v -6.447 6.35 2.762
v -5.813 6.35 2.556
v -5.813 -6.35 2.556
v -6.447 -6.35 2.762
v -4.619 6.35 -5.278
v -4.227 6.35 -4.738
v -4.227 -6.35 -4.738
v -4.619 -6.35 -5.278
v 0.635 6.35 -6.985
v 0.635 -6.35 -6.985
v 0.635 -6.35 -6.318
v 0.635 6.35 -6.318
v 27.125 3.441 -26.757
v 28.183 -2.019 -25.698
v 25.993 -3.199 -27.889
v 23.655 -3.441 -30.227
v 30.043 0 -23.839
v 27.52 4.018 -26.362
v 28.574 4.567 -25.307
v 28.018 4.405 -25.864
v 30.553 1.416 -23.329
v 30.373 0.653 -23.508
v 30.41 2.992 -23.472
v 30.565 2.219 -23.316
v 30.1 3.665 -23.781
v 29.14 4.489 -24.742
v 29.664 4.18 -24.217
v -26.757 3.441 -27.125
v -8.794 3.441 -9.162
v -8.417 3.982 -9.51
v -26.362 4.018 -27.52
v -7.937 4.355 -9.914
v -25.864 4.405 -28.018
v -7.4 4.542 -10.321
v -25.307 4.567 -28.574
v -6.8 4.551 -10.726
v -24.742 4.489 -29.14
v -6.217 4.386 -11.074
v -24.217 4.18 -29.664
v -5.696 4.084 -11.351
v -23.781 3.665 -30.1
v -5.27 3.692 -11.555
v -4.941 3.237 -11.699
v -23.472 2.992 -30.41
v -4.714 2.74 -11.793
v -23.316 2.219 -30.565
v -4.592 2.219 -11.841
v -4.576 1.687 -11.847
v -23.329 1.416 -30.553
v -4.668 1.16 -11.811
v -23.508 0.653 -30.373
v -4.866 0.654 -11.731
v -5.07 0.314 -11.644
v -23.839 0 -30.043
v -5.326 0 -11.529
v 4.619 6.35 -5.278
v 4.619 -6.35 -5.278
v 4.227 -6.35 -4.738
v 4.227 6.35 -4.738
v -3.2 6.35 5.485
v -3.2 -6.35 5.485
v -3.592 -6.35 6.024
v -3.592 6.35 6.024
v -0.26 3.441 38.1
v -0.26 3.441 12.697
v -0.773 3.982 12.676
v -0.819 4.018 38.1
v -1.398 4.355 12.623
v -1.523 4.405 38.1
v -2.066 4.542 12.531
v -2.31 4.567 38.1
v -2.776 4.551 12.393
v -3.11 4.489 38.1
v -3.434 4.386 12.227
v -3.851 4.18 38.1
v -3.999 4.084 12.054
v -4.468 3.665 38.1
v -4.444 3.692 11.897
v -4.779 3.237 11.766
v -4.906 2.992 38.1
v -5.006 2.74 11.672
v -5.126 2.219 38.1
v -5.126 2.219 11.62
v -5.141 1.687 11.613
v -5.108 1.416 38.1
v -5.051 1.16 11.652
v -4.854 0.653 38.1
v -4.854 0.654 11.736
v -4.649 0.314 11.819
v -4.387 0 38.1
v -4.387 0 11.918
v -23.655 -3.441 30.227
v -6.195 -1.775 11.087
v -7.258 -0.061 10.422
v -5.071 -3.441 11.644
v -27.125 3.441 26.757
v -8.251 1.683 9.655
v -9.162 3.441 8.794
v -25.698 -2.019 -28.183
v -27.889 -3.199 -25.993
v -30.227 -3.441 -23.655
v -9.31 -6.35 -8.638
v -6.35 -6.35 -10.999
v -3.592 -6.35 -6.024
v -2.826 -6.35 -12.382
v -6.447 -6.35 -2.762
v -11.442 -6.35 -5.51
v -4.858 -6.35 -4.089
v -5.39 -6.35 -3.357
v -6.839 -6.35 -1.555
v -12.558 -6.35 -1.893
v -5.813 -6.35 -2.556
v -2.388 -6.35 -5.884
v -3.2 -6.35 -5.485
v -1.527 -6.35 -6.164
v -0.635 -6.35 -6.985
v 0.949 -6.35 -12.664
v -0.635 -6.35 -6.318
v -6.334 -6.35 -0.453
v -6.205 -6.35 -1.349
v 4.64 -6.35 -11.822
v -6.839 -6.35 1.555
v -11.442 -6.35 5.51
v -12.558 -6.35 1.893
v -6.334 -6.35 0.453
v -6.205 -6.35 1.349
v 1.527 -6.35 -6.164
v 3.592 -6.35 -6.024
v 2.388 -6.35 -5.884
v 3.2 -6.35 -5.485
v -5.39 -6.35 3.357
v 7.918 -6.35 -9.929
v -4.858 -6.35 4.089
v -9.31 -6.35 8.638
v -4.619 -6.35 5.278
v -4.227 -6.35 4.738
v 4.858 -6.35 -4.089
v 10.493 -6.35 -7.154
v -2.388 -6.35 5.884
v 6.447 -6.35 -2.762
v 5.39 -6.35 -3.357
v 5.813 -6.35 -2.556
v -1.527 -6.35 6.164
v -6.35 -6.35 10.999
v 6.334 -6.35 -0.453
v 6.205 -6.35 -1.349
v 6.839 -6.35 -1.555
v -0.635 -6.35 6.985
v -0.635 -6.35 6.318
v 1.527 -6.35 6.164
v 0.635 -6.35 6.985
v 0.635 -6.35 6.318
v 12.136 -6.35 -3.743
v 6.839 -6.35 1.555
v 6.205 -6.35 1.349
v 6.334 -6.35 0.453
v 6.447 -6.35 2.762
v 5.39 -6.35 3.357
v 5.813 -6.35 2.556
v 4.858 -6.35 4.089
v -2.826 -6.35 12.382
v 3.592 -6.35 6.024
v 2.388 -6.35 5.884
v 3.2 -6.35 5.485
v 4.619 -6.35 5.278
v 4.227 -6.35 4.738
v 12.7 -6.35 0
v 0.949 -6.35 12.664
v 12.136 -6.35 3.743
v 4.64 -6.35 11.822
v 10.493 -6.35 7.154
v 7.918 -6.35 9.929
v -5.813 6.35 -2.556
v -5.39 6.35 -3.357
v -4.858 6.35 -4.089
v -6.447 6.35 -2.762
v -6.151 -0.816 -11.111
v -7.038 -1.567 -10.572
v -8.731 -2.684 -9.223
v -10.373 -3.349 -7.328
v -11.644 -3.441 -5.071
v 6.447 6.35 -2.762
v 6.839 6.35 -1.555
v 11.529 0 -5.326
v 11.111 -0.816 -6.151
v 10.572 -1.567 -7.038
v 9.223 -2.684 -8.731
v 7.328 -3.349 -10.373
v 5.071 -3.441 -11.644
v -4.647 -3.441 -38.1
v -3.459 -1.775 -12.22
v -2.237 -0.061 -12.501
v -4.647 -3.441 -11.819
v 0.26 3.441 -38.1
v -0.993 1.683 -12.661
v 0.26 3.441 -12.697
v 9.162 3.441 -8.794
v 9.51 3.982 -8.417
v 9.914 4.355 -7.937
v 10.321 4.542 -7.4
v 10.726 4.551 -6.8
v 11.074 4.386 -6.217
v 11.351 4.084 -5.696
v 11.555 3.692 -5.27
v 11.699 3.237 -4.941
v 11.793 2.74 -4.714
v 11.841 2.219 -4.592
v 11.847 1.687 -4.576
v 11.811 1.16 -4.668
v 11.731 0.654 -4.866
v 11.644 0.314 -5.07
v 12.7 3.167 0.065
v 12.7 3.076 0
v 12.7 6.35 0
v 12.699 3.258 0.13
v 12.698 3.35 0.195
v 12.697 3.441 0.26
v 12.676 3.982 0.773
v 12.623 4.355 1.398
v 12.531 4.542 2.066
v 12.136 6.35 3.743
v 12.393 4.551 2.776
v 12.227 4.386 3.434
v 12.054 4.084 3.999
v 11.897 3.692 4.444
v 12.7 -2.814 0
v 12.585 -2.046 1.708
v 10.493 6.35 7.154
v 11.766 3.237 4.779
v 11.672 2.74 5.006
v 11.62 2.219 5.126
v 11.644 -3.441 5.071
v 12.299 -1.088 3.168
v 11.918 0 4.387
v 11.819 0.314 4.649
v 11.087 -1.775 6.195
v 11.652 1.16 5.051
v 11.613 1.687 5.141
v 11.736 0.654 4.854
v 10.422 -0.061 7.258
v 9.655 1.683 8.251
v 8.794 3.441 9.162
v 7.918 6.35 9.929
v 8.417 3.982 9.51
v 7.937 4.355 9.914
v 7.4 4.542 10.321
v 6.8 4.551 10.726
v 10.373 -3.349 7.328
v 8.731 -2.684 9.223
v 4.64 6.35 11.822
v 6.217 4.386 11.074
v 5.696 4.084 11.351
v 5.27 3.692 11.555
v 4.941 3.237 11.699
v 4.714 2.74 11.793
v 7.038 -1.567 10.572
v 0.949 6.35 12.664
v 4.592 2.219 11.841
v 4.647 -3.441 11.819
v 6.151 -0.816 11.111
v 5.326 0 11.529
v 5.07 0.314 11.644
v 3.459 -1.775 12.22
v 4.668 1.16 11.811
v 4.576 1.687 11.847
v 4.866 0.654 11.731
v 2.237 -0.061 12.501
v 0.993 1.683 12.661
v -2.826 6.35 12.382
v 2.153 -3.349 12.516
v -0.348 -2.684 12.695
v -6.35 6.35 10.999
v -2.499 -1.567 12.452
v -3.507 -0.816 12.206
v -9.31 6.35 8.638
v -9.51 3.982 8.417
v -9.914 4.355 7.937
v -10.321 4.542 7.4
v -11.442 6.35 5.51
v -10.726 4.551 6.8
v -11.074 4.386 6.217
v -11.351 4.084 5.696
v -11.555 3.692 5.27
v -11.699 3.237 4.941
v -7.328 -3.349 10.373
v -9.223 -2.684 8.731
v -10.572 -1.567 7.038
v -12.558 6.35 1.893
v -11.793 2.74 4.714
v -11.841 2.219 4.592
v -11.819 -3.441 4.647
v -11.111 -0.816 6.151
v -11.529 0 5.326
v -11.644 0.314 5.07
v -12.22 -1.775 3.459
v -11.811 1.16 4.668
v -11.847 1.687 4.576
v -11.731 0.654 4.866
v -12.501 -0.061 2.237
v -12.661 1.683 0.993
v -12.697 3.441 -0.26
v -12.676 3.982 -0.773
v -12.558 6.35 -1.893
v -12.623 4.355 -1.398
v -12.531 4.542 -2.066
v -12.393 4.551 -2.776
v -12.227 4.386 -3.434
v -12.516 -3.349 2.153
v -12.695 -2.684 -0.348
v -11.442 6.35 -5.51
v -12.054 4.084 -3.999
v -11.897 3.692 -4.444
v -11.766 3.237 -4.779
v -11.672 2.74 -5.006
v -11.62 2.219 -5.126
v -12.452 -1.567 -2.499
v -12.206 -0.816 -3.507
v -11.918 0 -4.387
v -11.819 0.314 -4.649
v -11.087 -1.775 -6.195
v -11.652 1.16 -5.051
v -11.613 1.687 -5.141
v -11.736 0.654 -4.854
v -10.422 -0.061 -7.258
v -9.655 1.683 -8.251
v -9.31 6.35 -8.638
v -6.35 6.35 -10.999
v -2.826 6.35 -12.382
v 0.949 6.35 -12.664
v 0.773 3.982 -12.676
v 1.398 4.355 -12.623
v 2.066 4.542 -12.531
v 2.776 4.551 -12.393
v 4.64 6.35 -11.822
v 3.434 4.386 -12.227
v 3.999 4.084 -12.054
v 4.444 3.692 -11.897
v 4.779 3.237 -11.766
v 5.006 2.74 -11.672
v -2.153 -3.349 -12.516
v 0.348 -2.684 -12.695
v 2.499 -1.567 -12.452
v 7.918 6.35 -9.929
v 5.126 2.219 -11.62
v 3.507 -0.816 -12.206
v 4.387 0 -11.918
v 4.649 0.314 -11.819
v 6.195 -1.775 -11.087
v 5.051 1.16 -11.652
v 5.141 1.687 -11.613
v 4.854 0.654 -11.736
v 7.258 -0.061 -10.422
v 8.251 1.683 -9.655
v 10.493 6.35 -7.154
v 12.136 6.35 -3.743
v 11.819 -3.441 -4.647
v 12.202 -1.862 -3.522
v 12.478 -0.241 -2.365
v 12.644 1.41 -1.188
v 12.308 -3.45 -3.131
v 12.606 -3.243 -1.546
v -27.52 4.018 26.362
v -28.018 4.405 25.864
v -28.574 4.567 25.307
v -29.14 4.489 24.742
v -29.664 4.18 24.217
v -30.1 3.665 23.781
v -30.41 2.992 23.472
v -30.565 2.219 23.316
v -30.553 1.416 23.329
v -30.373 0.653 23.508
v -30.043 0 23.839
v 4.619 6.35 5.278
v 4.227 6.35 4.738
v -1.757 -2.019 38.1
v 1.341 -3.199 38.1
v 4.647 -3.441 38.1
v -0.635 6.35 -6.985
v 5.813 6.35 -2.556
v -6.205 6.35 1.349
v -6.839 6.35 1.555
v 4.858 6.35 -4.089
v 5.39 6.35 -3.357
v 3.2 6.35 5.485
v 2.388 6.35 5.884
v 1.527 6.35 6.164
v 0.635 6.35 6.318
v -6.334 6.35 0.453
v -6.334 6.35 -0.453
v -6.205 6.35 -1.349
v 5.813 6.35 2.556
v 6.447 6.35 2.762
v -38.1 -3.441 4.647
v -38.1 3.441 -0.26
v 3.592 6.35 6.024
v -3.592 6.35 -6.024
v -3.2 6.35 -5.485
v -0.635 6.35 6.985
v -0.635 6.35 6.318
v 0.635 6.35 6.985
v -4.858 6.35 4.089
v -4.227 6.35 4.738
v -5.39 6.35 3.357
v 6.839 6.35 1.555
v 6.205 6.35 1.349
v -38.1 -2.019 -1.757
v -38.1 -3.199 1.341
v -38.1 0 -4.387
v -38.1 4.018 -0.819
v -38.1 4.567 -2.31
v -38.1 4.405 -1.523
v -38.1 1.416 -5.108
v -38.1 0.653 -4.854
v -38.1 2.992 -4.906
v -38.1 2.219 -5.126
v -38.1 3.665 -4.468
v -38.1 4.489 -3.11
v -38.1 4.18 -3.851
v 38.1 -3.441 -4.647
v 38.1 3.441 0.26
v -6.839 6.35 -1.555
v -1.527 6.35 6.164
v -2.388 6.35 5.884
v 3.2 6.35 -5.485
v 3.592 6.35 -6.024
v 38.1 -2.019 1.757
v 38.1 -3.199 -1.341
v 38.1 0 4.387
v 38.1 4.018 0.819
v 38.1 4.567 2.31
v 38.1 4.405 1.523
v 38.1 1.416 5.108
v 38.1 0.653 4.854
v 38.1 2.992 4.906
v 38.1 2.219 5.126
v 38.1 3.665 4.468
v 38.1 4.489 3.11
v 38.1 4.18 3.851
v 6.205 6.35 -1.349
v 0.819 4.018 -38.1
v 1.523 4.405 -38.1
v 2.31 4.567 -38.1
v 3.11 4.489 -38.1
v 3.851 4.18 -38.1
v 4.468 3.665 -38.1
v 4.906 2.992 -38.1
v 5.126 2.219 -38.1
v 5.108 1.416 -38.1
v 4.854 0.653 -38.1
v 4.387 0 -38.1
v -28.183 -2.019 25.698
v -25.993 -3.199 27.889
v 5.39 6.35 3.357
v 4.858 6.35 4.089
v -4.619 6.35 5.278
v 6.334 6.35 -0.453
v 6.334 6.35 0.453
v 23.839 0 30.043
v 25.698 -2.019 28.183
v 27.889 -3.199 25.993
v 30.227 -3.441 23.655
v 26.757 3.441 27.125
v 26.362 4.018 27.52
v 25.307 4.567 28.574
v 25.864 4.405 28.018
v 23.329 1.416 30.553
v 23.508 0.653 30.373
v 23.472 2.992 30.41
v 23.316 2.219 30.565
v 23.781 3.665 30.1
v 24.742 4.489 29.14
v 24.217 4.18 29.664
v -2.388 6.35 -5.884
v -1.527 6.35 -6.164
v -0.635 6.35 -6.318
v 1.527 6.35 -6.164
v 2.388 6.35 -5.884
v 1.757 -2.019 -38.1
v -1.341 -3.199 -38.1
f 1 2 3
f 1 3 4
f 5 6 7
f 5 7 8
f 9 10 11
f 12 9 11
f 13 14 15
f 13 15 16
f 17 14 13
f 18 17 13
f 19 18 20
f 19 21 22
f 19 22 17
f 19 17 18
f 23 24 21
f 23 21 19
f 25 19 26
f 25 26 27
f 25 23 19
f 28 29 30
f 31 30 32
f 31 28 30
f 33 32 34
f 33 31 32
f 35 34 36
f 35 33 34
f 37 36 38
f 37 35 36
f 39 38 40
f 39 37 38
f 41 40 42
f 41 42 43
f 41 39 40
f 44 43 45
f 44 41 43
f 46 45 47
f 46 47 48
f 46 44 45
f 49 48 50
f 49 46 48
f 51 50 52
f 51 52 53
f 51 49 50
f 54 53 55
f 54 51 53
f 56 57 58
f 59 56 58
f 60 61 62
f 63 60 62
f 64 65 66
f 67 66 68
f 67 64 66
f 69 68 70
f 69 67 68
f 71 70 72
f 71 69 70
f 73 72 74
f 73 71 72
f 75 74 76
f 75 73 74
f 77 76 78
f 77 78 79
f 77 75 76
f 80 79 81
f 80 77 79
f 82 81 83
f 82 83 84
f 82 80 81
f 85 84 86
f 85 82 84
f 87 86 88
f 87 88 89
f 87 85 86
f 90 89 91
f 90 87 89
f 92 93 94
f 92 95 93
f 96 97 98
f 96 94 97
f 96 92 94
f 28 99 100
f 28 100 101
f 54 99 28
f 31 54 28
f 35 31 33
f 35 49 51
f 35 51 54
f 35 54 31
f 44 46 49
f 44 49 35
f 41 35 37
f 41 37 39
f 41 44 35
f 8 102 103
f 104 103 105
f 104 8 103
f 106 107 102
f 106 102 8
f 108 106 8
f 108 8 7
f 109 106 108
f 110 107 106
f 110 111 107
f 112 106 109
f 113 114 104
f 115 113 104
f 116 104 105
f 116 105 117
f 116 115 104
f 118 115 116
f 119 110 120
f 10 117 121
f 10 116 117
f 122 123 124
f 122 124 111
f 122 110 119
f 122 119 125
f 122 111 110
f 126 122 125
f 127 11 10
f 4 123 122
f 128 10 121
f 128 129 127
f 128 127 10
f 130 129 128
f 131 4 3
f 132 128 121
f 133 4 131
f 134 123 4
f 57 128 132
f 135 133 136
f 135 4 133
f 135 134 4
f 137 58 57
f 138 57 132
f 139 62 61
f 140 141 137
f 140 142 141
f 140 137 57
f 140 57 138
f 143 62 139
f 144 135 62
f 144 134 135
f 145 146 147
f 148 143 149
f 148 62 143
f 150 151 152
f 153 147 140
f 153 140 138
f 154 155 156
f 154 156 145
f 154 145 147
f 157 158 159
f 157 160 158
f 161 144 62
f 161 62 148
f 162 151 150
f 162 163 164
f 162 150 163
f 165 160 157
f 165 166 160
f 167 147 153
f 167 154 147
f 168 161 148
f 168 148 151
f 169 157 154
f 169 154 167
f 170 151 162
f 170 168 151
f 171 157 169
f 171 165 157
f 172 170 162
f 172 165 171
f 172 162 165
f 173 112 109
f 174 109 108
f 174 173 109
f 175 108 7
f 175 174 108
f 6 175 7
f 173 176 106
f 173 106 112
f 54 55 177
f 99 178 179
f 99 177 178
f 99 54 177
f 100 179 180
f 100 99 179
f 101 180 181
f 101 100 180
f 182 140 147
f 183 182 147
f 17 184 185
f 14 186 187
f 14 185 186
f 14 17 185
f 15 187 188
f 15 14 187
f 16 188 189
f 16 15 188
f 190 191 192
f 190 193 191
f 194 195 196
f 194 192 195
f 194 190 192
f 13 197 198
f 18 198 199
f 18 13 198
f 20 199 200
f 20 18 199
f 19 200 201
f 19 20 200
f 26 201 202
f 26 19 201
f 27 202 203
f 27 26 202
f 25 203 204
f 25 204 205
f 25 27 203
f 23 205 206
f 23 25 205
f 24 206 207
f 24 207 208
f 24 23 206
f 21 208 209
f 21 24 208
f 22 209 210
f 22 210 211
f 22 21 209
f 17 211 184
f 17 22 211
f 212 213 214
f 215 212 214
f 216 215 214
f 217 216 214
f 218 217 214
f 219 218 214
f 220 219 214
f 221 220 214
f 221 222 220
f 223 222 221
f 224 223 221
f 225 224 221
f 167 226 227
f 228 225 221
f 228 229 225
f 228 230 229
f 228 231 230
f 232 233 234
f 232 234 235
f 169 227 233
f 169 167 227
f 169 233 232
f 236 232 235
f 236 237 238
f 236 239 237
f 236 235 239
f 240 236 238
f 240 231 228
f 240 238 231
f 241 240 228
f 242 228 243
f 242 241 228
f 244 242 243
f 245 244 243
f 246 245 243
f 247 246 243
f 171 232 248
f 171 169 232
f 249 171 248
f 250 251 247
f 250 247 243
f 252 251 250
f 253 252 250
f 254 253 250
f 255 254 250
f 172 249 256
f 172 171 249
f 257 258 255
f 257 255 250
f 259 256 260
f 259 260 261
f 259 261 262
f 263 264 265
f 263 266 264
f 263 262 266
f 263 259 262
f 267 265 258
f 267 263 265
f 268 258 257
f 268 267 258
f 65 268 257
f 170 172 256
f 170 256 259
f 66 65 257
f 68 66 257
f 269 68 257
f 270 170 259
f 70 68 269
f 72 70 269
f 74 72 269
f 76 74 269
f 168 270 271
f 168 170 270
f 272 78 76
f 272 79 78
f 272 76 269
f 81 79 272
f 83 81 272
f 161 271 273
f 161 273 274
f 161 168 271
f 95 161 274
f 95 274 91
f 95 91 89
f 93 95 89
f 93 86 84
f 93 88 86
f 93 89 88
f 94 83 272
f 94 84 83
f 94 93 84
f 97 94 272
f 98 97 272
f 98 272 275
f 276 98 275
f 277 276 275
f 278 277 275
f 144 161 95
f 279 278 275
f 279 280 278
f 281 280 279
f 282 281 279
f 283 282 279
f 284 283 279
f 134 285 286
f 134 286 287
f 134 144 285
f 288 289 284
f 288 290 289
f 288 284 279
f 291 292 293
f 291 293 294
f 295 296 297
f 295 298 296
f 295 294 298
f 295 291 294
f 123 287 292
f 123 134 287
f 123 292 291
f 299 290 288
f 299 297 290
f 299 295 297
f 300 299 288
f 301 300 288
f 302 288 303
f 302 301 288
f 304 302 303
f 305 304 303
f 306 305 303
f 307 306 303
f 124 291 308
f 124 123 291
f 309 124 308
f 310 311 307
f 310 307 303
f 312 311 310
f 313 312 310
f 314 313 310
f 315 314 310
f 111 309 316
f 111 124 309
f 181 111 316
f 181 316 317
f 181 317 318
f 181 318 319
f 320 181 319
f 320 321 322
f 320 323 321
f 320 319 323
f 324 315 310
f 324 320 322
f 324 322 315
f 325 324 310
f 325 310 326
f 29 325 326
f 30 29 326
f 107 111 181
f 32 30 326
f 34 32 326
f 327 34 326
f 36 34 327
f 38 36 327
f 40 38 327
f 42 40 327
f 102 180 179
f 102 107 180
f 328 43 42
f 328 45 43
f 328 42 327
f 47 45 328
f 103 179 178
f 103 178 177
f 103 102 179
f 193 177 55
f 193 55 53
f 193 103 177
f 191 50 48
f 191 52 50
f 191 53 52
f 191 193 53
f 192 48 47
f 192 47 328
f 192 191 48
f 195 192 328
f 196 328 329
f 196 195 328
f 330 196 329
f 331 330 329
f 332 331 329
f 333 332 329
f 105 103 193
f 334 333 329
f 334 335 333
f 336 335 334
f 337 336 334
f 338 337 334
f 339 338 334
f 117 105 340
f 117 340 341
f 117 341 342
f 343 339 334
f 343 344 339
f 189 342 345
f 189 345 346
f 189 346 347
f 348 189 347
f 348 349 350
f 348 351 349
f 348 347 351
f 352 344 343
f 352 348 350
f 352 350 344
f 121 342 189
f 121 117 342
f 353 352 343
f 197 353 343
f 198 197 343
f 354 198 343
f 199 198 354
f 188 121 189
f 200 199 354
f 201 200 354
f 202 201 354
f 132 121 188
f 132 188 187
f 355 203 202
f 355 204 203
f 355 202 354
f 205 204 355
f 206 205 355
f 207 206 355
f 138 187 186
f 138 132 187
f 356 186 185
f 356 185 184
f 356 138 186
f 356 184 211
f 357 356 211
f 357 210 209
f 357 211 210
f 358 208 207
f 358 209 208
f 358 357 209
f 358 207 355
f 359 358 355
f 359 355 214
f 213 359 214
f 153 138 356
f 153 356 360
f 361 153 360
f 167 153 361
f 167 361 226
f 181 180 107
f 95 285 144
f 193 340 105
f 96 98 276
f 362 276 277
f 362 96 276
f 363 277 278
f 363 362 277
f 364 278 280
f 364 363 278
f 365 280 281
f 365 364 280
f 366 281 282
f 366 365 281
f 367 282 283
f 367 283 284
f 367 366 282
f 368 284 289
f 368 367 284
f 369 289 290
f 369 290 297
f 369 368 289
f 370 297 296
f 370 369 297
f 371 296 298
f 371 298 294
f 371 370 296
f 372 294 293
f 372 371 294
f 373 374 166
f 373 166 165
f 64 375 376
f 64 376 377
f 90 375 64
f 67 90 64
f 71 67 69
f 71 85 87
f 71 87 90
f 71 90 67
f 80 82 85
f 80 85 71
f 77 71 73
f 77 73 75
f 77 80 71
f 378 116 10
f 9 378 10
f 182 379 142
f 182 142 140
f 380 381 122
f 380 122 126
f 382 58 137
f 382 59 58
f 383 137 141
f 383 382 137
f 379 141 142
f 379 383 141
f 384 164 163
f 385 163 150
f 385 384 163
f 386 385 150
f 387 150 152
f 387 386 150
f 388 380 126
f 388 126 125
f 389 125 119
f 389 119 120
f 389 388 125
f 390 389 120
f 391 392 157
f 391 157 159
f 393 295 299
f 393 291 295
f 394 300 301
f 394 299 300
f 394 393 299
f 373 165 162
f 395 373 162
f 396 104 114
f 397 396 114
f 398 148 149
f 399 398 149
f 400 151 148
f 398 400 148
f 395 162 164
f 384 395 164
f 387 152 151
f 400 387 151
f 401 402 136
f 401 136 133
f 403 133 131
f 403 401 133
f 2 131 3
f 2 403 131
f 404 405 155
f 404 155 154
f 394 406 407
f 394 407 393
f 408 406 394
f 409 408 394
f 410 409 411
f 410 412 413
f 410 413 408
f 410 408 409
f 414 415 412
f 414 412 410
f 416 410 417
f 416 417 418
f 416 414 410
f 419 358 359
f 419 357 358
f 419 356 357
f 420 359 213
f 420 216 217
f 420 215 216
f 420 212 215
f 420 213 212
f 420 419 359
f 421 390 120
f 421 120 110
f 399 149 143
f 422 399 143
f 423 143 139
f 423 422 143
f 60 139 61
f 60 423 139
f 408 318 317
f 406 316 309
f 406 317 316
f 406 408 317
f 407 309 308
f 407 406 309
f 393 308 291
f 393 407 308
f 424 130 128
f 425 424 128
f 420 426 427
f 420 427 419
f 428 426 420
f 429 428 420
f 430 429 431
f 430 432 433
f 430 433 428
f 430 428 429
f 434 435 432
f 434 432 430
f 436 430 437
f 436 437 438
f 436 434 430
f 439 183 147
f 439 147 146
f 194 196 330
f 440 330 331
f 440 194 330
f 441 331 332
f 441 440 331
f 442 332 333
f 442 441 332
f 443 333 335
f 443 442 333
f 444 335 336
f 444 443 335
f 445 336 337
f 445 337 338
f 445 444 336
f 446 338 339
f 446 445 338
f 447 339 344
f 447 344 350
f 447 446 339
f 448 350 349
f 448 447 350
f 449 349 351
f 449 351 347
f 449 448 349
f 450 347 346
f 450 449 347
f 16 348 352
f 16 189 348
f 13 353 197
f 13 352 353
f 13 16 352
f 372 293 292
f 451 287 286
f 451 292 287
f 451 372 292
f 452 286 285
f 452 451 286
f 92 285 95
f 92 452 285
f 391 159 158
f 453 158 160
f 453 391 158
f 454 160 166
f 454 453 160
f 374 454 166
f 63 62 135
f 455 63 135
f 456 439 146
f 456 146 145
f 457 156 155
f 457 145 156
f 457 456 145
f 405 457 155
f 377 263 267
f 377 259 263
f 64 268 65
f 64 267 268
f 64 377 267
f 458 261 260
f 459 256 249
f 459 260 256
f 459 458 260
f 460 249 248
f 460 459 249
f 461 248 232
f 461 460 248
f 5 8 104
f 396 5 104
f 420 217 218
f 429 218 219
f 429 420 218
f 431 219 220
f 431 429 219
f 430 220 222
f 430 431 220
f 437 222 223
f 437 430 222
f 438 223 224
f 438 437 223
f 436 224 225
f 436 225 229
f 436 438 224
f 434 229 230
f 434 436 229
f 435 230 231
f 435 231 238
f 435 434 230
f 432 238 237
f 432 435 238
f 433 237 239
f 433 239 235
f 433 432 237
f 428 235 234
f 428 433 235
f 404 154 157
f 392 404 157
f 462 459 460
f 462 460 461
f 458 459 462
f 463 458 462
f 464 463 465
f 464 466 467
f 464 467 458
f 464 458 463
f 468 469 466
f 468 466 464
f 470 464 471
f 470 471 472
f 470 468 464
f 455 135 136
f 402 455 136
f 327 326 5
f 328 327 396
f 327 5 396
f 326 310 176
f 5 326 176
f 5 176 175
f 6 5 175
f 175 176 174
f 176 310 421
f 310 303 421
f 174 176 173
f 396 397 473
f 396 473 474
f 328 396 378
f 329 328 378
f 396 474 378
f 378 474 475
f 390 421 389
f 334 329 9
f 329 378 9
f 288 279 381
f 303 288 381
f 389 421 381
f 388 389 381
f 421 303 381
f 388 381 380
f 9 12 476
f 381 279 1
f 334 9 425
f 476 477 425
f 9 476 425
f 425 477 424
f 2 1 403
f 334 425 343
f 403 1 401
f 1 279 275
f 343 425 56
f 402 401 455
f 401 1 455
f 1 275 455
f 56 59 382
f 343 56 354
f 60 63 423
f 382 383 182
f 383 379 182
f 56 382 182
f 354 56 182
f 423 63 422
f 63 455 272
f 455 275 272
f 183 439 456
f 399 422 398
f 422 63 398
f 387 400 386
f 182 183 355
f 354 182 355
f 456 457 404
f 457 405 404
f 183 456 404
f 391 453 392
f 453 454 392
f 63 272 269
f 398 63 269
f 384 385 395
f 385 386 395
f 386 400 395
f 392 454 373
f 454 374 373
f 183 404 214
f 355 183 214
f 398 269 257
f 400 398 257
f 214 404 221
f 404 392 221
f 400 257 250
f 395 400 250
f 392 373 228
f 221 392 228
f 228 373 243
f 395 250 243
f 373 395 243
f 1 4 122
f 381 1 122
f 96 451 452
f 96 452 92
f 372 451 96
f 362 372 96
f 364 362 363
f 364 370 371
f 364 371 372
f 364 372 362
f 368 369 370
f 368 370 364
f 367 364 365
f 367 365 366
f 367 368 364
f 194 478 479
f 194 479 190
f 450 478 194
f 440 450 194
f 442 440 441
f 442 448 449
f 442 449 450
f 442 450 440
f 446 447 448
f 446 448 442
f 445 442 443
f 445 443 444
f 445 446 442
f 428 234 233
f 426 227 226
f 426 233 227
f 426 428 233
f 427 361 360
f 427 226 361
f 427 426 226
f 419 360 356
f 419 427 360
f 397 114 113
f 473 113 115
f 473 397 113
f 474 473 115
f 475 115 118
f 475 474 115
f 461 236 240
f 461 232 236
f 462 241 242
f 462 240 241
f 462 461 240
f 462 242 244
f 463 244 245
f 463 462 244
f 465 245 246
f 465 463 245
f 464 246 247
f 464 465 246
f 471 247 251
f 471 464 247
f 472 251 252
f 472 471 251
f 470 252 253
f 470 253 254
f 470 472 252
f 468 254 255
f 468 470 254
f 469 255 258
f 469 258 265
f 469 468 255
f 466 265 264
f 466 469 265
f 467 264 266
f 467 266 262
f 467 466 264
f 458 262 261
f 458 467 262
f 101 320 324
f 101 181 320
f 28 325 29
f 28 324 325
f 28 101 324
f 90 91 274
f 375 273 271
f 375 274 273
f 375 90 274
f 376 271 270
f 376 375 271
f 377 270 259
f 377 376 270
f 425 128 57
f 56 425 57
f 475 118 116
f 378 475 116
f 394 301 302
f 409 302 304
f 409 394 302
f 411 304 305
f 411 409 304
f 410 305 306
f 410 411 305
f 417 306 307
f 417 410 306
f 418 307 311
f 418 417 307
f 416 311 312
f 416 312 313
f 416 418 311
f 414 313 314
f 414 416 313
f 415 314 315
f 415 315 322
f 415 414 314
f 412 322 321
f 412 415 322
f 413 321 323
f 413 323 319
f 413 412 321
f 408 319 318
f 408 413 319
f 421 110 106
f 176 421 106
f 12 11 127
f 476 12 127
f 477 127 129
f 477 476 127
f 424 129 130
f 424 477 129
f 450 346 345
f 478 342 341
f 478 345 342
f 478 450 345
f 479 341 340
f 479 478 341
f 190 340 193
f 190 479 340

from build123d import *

# Parameters (mm, degrees)
F0_R            = 12.7
F0_R_2          = 6.35
F1_DEPTH        = 6.35
F4_DEPTH        = 25.4
F7_DEPTH        = 30.48
F7_COPIES_COUNT = 8


# Not quite as in the source:
# - a pattern or mirror of a feature is missing from the dataset's text; its kind, count and spacing are read off the source's solid


with BuildPart() as f1:
    # F0 (on Front) → F1 (new body, symmetric)
    with BuildSketch(Plane.XZ):
        Circle(F0_R)
        Circle(F0_R_2, mode=Mode.SUBTRACT)
    extrude(amount=F1_DEPTH, both=True)

    # F3 (on offset) → F4 (cut)
    with BuildSketch(Plane.XZ.offset(6.35)):
        with BuildLine():
            Line((-3.2000014887, 5.4847507211), (-3.5919541958, 6.0242273409))
            Line((-3.5919541958, 6.0242273409), (-4.6194057787, 5.2777400705))
            Line((-4.6194057787, 5.2777400705), (-4.2274530715, 4.7382634507))
            ThreePointArc((-4.2274530715, 4.7382634507), (-3.7324363521, 5.1372579143), (-3.2000014887, 5.4847507211))
        make_face()
        with BuildLine():
            ThreePointArc((-0.635, 6.3181702256), (0, 6.35), (0.635, 6.3181702256))
            Line((0.635, 6.3181702256), (0.635, 6.985))
            Line((0.635, 6.985), (-0.635, 6.985))
            Line((-0.635, 6.985), (-0.635, 6.3181702256))
        make_face()
        with BuildLine():
            Line((4.2274530715, 4.7382634507), (4.6194057787, 5.2777400705))
            Line((4.6194057787, 5.2777400705), (3.5919541958, 6.0242273409))
            Line((3.5919541958, 6.0242273409), (3.2000014887, 5.4847507211))
            ThreePointArc((3.2000014887, 5.4847507211), (3.7324363521, 5.1372579143), (4.2274530715, 4.7382634507))
        make_face()
        with BuildLine():
            Line((6.2051627556, 1.3485010852), (6.8393555577, 1.5545628179))
            Line((6.8393555577, 1.5545628179), (6.4469039749, 2.7624045936))
            Line((6.4469039749, 2.7624045936), (5.8127111727, 2.5563428609))
            ThreePointArc((5.8127111727, 2.5563428609), (6.0392088785, 1.9622579143), (6.2051627556, 1.3485010852))
        make_face()
        with BuildLine():
            Line((5.8127111727, -2.5563428609), (6.4469039749, -2.7624045936))
            Line((6.4469039749, -2.7624045936), (6.8393555577, -1.5545628179))
            Line((6.8393555577, -1.5545628179), (6.2051627556, -1.3485010852))
            ThreePointArc((6.2051627556, -1.3485010852), (6.0392088785, -1.9622579143), (5.8127111727, -2.5563428609))
        make_face()
        with BuildLine():
            Line((-6.2051627556, -1.3485010852), (-6.8393555577, -1.5545628179))
            Line((-6.8393555577, -1.5545628179), (-6.4469039749, -2.7624045936))
            Line((-6.4469039749, -2.7624045936), (-5.8127111727, -2.5563428609))
            ThreePointArc((-5.8127111727, -2.5563428609), (-6.0392088785, -1.9622579143), (-6.2051627556, -1.3485010852))
        make_face()
        with BuildLine():
            Line((-5.8127111727, 2.5563428609), (-6.4469039749, 2.7624045936))
            Line((-6.4469039749, 2.7624045936), (-6.8393555577, 1.5545628179))
            Line((-6.8393555577, 1.5545628179), (-6.2051627556, 1.3485010852))
            ThreePointArc((-6.2051627556, 1.3485010852), (-6.0392088785, 1.9622579143), (-5.8127111727, 2.5563428609))
        make_face()
        with BuildLine():
            Line((-4.2274530715, -4.7382634507), (-4.6194057787, -5.2777400705))
            Line((-4.6194057787, -5.2777400705), (-3.5919541958, -6.0242273409))
            Line((-3.5919541958, -6.0242273409), (-3.2000014887, -5.4847507211))
            ThreePointArc((-3.2000014887, -5.4847507211), (-3.7324363521, -5.1372579143), (-4.2274530715, -4.7382634507))
        make_face()
        with BuildLine():
            Line((-0.635, -6.3181702256), (-0.635, -6.985))
            Line((-0.635, -6.985), (0.635, -6.985))
            Line((0.635, -6.985), (0.635, -6.3181702256))
            ThreePointArc((0.635, -6.3181702256), (0, -6.35), (-0.635, -6.3181702256))
        make_face()
        with BuildLine():
            Line((3.2000014887, -5.4847507211), (3.5919541958, -6.0242273409))
            Line((3.5919541958, -6.0242273409), (4.6194057787, -5.2777400705))
            Line((4.6194057787, -5.2777400705), (4.2274530715, -4.7382634507))
            ThreePointArc((4.2274530715, -4.7382634507), (3.7324363521, -5.1372579143), (3.2000014887, -5.4847507211))
        make_face()
    extrude(amount=-F4_DEPTH, mode=Mode.SUBTRACT)

    # F6 (on offset) → F7 (join)
    with BuildSketch(Plane.YZ.offset(38.1)):
        with BuildLine():
            ThreePointArc((0, 4.386866935), (-2.7218067049, 0.2512213266), (-3.4407728063, -4.64723599))
            Line((-3.4407728063, -4.64723599), (3.4407728063, 0.260369055))
            ThreePointArc((3.4407728063, 0.260369055), (3.9456637131, 4.1791075354), (0, 4.386866935))
        make_face()
    f7 = extrude(amount=-F7_DEPTH)

    # F7_copies: F7 ×8 about axis
    f7_copies_axis = Axis((0, 0, 0), (0, 1, 0))
    for i in range(1, F7_COPIES_COUNT):
        add(f7.rotate(f7_copies_axis, i * 360 / F7_COPIES_COUNT))


solid = f1.part
